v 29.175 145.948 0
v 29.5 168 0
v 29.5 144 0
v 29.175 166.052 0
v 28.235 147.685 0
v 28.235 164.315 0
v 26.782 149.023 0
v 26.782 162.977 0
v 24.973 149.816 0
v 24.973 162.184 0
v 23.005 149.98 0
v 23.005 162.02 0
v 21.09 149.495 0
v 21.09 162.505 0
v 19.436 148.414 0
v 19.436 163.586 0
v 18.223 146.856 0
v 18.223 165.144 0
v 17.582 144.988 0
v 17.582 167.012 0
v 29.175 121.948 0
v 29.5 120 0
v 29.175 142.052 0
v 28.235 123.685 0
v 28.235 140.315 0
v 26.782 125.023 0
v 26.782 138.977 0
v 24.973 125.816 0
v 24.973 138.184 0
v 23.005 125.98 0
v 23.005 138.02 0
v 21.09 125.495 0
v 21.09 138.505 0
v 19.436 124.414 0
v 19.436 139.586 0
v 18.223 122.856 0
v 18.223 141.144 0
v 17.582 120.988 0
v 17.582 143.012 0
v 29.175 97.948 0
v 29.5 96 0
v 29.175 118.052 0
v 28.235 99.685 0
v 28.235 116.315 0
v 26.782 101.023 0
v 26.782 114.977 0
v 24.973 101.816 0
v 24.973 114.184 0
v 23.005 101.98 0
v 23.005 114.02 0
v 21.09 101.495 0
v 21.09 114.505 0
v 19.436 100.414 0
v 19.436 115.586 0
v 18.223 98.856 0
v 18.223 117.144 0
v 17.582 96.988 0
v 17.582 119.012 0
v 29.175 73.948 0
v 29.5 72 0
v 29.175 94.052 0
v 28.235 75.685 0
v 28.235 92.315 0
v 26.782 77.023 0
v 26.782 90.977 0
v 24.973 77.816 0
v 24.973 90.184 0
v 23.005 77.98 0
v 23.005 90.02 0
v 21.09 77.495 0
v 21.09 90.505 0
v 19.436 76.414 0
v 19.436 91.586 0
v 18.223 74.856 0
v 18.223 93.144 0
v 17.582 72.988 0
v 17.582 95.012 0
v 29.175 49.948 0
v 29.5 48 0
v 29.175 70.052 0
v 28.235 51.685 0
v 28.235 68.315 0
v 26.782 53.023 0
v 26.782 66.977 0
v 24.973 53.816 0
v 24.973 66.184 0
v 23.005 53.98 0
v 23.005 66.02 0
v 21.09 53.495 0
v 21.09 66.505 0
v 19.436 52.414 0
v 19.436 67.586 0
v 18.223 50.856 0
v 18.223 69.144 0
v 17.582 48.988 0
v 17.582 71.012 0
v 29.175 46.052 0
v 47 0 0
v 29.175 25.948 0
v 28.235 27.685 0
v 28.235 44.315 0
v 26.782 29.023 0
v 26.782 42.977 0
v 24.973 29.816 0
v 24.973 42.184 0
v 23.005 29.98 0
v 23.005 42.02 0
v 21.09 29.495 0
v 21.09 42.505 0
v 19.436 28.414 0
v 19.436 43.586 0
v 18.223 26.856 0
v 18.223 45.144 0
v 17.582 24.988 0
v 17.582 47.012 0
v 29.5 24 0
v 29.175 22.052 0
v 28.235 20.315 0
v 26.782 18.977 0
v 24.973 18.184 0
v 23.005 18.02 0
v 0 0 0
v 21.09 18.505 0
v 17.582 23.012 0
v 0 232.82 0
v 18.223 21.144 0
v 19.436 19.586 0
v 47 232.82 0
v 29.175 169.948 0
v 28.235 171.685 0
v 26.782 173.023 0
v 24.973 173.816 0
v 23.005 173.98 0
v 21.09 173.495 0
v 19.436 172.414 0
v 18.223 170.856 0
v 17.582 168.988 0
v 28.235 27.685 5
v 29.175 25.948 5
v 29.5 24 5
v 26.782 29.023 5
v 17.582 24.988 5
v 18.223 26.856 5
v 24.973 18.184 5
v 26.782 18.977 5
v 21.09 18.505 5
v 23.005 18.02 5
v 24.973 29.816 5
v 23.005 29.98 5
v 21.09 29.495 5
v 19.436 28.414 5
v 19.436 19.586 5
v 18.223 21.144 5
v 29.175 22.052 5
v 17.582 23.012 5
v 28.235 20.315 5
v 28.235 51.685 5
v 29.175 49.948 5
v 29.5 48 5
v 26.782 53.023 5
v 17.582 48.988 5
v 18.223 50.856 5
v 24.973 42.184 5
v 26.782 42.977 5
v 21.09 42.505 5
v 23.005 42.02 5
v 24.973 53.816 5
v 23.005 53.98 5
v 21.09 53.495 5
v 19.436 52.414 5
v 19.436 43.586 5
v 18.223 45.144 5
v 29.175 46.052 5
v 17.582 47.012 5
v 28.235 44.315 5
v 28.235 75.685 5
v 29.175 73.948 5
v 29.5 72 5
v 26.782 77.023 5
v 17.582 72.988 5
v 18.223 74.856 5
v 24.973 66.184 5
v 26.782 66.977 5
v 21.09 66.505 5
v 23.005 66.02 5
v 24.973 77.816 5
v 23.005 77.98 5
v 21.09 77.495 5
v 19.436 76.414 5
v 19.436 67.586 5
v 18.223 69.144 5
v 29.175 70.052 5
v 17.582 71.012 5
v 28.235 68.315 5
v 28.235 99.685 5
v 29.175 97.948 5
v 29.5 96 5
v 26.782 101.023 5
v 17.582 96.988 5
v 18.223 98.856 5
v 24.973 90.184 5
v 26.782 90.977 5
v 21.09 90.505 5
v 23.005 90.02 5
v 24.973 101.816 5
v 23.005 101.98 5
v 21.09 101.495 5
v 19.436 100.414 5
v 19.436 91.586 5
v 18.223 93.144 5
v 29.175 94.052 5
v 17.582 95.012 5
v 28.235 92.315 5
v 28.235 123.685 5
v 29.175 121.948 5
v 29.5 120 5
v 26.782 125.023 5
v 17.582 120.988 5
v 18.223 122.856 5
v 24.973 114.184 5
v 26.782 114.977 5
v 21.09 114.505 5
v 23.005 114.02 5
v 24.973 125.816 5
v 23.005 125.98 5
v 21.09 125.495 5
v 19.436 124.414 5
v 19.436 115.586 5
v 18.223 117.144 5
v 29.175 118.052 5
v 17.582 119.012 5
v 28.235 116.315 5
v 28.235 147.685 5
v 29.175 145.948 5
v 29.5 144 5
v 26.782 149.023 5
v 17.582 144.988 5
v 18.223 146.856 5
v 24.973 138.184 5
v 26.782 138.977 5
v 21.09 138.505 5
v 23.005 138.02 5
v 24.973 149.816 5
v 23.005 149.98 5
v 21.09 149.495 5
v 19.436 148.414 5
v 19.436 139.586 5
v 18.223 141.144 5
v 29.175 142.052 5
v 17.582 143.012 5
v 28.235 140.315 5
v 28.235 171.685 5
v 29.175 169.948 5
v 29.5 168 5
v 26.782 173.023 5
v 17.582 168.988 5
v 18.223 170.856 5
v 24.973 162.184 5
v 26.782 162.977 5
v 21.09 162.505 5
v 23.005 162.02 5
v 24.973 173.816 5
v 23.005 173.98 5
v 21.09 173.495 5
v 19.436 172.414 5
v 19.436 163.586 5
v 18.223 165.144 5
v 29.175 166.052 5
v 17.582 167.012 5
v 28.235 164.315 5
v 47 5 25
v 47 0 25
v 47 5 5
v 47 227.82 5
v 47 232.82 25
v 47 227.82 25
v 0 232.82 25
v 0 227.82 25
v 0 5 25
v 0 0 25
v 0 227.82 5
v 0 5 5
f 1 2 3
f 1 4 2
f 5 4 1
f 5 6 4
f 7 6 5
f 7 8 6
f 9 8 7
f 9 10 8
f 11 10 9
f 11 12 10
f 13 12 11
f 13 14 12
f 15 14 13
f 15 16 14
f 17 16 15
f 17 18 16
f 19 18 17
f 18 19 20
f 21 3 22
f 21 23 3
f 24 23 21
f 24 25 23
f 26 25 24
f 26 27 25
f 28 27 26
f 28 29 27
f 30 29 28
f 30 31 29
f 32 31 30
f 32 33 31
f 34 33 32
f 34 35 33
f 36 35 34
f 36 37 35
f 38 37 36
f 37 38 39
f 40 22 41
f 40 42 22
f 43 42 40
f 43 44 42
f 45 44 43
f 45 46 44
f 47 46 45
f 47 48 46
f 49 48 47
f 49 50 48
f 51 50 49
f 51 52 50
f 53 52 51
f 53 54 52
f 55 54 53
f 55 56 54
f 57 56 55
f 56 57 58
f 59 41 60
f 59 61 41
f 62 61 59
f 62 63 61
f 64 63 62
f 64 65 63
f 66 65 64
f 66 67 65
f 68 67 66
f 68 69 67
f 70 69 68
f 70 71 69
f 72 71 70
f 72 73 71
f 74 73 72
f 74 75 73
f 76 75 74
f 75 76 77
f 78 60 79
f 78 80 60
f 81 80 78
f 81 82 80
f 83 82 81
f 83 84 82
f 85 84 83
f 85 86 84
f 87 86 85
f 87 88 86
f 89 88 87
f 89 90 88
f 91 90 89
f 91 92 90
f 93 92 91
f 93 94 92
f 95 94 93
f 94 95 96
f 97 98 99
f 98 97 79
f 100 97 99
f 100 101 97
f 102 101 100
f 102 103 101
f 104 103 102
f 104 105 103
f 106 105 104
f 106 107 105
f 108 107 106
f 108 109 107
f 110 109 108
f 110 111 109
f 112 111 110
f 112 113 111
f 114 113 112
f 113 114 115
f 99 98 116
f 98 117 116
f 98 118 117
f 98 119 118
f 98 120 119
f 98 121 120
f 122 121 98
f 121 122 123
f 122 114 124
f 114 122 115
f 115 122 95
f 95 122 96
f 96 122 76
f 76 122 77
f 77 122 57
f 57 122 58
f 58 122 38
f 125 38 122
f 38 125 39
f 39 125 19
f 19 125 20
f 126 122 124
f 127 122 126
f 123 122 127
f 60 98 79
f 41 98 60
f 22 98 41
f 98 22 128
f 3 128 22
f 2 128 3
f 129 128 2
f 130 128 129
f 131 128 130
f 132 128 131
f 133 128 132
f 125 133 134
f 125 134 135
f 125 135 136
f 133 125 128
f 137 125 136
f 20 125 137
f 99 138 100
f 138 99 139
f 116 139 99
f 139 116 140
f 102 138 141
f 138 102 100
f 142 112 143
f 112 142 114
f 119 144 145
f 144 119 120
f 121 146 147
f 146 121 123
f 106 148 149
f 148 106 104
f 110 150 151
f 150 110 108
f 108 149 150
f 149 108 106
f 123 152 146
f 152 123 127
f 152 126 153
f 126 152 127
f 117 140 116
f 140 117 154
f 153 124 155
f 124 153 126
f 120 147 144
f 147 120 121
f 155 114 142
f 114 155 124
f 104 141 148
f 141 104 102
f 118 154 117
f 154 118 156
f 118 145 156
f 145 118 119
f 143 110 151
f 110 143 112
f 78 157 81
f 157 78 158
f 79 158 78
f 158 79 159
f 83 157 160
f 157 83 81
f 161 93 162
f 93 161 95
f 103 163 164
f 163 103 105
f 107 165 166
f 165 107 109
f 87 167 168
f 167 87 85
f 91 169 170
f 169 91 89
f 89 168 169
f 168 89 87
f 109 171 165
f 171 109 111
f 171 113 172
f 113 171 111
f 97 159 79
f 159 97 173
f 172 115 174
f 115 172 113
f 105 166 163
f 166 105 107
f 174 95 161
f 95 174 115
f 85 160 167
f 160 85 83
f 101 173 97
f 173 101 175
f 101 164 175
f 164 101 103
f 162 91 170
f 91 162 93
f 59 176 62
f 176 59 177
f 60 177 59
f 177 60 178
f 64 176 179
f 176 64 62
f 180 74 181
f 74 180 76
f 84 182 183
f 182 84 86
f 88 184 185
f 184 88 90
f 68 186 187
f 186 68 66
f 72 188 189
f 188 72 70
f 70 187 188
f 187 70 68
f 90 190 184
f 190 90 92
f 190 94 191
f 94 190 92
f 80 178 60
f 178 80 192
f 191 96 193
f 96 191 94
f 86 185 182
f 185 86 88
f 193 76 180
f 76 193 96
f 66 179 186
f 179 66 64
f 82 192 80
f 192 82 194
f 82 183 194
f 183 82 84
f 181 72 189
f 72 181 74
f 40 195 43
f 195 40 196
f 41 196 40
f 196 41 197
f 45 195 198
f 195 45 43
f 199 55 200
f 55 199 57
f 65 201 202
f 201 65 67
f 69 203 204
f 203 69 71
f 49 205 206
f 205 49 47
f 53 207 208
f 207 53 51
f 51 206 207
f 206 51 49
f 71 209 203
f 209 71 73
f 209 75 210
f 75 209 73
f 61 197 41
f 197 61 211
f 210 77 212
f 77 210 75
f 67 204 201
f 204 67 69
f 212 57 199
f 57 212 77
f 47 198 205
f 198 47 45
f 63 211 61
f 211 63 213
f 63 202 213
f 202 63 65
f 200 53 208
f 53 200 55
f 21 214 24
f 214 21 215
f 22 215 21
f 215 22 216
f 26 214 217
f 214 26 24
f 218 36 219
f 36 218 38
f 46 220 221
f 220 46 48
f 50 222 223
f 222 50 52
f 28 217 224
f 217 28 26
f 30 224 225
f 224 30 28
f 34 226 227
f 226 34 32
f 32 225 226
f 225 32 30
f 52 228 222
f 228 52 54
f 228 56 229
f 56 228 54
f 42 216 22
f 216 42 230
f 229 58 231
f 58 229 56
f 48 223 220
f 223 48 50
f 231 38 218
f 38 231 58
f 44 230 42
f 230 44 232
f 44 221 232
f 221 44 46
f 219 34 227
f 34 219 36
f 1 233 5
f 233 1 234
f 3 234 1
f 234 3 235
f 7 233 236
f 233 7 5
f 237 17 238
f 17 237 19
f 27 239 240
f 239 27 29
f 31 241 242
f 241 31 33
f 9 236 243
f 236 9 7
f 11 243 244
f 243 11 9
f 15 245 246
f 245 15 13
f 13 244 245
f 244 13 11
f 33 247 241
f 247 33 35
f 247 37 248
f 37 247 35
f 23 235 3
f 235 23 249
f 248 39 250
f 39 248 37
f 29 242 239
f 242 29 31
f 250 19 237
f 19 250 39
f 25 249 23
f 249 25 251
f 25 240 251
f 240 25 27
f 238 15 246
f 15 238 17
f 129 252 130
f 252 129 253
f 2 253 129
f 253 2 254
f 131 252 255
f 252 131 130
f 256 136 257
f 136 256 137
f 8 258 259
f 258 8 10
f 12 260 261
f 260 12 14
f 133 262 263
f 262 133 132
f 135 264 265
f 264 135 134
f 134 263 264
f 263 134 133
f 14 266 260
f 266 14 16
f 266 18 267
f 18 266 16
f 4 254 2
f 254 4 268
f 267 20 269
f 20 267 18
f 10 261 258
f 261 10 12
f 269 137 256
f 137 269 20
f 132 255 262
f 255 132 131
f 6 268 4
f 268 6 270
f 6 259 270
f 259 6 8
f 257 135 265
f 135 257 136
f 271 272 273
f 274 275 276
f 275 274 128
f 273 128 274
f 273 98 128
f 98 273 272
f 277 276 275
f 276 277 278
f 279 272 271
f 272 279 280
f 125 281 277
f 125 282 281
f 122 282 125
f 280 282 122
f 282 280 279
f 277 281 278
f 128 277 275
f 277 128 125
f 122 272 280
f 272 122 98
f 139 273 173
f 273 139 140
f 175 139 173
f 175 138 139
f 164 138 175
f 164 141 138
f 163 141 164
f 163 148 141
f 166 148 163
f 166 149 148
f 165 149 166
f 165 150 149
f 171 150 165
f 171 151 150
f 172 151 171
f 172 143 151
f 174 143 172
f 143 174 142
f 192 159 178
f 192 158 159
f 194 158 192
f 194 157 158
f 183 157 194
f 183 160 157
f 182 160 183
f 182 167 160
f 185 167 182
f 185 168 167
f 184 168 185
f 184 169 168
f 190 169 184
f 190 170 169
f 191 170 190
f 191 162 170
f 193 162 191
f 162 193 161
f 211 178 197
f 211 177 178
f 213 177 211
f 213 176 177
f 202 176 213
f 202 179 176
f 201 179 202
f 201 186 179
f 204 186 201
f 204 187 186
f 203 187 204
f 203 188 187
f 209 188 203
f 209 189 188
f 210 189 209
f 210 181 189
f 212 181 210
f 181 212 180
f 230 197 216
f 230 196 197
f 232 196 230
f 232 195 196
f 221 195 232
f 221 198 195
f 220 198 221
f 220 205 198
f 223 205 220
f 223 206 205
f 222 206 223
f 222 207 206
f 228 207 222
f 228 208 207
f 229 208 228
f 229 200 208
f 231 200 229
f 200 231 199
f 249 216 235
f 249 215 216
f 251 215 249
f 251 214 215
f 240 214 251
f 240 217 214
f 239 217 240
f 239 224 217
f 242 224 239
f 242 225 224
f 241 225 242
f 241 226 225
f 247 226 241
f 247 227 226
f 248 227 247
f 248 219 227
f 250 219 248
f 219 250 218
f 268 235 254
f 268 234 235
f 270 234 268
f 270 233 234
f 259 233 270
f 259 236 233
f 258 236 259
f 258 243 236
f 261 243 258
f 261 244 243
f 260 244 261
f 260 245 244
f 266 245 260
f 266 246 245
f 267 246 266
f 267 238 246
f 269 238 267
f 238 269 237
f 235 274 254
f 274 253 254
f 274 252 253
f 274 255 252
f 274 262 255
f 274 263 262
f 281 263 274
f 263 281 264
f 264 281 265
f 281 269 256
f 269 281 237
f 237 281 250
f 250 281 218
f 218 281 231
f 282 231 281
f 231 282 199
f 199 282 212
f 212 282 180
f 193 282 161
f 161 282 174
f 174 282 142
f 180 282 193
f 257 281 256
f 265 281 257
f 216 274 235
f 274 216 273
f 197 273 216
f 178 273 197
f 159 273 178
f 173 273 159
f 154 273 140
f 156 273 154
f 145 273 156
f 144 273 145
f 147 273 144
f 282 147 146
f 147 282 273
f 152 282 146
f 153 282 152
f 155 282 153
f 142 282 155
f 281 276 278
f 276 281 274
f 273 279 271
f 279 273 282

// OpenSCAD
module Control_panel(){
    
    WIDTH = 47;
    DEPTH = 232.82;
    HEIGHT = 30;
    BASE_HEIGHT = 5;
    OUTER_WALL = 5;
    BUTTON_COUNT = 7;
    BUTTON_DIAMETER = 12;
    
    difference(){
        cube([WIDTH,DEPTH,HEIGHT-BASE_HEIGHT]);
        
        // cutout
        translate([0,OUTER_WALL,BASE_HEIGHT]){
            cube([WIDTH,DEPTH-(OUTER_WALL*2),HEIGHT]);
        }
        
        // power control holes
        for(x=[1:BUTTON_COUNT]){
            translate([(WIDTH/2),x*(16*1.5),0]){
                #cylinder(r=BUTTON_DIAMETER/2,h=BASE_HEIGHT*2);
            }
        }
    }
}

Control_panel();
